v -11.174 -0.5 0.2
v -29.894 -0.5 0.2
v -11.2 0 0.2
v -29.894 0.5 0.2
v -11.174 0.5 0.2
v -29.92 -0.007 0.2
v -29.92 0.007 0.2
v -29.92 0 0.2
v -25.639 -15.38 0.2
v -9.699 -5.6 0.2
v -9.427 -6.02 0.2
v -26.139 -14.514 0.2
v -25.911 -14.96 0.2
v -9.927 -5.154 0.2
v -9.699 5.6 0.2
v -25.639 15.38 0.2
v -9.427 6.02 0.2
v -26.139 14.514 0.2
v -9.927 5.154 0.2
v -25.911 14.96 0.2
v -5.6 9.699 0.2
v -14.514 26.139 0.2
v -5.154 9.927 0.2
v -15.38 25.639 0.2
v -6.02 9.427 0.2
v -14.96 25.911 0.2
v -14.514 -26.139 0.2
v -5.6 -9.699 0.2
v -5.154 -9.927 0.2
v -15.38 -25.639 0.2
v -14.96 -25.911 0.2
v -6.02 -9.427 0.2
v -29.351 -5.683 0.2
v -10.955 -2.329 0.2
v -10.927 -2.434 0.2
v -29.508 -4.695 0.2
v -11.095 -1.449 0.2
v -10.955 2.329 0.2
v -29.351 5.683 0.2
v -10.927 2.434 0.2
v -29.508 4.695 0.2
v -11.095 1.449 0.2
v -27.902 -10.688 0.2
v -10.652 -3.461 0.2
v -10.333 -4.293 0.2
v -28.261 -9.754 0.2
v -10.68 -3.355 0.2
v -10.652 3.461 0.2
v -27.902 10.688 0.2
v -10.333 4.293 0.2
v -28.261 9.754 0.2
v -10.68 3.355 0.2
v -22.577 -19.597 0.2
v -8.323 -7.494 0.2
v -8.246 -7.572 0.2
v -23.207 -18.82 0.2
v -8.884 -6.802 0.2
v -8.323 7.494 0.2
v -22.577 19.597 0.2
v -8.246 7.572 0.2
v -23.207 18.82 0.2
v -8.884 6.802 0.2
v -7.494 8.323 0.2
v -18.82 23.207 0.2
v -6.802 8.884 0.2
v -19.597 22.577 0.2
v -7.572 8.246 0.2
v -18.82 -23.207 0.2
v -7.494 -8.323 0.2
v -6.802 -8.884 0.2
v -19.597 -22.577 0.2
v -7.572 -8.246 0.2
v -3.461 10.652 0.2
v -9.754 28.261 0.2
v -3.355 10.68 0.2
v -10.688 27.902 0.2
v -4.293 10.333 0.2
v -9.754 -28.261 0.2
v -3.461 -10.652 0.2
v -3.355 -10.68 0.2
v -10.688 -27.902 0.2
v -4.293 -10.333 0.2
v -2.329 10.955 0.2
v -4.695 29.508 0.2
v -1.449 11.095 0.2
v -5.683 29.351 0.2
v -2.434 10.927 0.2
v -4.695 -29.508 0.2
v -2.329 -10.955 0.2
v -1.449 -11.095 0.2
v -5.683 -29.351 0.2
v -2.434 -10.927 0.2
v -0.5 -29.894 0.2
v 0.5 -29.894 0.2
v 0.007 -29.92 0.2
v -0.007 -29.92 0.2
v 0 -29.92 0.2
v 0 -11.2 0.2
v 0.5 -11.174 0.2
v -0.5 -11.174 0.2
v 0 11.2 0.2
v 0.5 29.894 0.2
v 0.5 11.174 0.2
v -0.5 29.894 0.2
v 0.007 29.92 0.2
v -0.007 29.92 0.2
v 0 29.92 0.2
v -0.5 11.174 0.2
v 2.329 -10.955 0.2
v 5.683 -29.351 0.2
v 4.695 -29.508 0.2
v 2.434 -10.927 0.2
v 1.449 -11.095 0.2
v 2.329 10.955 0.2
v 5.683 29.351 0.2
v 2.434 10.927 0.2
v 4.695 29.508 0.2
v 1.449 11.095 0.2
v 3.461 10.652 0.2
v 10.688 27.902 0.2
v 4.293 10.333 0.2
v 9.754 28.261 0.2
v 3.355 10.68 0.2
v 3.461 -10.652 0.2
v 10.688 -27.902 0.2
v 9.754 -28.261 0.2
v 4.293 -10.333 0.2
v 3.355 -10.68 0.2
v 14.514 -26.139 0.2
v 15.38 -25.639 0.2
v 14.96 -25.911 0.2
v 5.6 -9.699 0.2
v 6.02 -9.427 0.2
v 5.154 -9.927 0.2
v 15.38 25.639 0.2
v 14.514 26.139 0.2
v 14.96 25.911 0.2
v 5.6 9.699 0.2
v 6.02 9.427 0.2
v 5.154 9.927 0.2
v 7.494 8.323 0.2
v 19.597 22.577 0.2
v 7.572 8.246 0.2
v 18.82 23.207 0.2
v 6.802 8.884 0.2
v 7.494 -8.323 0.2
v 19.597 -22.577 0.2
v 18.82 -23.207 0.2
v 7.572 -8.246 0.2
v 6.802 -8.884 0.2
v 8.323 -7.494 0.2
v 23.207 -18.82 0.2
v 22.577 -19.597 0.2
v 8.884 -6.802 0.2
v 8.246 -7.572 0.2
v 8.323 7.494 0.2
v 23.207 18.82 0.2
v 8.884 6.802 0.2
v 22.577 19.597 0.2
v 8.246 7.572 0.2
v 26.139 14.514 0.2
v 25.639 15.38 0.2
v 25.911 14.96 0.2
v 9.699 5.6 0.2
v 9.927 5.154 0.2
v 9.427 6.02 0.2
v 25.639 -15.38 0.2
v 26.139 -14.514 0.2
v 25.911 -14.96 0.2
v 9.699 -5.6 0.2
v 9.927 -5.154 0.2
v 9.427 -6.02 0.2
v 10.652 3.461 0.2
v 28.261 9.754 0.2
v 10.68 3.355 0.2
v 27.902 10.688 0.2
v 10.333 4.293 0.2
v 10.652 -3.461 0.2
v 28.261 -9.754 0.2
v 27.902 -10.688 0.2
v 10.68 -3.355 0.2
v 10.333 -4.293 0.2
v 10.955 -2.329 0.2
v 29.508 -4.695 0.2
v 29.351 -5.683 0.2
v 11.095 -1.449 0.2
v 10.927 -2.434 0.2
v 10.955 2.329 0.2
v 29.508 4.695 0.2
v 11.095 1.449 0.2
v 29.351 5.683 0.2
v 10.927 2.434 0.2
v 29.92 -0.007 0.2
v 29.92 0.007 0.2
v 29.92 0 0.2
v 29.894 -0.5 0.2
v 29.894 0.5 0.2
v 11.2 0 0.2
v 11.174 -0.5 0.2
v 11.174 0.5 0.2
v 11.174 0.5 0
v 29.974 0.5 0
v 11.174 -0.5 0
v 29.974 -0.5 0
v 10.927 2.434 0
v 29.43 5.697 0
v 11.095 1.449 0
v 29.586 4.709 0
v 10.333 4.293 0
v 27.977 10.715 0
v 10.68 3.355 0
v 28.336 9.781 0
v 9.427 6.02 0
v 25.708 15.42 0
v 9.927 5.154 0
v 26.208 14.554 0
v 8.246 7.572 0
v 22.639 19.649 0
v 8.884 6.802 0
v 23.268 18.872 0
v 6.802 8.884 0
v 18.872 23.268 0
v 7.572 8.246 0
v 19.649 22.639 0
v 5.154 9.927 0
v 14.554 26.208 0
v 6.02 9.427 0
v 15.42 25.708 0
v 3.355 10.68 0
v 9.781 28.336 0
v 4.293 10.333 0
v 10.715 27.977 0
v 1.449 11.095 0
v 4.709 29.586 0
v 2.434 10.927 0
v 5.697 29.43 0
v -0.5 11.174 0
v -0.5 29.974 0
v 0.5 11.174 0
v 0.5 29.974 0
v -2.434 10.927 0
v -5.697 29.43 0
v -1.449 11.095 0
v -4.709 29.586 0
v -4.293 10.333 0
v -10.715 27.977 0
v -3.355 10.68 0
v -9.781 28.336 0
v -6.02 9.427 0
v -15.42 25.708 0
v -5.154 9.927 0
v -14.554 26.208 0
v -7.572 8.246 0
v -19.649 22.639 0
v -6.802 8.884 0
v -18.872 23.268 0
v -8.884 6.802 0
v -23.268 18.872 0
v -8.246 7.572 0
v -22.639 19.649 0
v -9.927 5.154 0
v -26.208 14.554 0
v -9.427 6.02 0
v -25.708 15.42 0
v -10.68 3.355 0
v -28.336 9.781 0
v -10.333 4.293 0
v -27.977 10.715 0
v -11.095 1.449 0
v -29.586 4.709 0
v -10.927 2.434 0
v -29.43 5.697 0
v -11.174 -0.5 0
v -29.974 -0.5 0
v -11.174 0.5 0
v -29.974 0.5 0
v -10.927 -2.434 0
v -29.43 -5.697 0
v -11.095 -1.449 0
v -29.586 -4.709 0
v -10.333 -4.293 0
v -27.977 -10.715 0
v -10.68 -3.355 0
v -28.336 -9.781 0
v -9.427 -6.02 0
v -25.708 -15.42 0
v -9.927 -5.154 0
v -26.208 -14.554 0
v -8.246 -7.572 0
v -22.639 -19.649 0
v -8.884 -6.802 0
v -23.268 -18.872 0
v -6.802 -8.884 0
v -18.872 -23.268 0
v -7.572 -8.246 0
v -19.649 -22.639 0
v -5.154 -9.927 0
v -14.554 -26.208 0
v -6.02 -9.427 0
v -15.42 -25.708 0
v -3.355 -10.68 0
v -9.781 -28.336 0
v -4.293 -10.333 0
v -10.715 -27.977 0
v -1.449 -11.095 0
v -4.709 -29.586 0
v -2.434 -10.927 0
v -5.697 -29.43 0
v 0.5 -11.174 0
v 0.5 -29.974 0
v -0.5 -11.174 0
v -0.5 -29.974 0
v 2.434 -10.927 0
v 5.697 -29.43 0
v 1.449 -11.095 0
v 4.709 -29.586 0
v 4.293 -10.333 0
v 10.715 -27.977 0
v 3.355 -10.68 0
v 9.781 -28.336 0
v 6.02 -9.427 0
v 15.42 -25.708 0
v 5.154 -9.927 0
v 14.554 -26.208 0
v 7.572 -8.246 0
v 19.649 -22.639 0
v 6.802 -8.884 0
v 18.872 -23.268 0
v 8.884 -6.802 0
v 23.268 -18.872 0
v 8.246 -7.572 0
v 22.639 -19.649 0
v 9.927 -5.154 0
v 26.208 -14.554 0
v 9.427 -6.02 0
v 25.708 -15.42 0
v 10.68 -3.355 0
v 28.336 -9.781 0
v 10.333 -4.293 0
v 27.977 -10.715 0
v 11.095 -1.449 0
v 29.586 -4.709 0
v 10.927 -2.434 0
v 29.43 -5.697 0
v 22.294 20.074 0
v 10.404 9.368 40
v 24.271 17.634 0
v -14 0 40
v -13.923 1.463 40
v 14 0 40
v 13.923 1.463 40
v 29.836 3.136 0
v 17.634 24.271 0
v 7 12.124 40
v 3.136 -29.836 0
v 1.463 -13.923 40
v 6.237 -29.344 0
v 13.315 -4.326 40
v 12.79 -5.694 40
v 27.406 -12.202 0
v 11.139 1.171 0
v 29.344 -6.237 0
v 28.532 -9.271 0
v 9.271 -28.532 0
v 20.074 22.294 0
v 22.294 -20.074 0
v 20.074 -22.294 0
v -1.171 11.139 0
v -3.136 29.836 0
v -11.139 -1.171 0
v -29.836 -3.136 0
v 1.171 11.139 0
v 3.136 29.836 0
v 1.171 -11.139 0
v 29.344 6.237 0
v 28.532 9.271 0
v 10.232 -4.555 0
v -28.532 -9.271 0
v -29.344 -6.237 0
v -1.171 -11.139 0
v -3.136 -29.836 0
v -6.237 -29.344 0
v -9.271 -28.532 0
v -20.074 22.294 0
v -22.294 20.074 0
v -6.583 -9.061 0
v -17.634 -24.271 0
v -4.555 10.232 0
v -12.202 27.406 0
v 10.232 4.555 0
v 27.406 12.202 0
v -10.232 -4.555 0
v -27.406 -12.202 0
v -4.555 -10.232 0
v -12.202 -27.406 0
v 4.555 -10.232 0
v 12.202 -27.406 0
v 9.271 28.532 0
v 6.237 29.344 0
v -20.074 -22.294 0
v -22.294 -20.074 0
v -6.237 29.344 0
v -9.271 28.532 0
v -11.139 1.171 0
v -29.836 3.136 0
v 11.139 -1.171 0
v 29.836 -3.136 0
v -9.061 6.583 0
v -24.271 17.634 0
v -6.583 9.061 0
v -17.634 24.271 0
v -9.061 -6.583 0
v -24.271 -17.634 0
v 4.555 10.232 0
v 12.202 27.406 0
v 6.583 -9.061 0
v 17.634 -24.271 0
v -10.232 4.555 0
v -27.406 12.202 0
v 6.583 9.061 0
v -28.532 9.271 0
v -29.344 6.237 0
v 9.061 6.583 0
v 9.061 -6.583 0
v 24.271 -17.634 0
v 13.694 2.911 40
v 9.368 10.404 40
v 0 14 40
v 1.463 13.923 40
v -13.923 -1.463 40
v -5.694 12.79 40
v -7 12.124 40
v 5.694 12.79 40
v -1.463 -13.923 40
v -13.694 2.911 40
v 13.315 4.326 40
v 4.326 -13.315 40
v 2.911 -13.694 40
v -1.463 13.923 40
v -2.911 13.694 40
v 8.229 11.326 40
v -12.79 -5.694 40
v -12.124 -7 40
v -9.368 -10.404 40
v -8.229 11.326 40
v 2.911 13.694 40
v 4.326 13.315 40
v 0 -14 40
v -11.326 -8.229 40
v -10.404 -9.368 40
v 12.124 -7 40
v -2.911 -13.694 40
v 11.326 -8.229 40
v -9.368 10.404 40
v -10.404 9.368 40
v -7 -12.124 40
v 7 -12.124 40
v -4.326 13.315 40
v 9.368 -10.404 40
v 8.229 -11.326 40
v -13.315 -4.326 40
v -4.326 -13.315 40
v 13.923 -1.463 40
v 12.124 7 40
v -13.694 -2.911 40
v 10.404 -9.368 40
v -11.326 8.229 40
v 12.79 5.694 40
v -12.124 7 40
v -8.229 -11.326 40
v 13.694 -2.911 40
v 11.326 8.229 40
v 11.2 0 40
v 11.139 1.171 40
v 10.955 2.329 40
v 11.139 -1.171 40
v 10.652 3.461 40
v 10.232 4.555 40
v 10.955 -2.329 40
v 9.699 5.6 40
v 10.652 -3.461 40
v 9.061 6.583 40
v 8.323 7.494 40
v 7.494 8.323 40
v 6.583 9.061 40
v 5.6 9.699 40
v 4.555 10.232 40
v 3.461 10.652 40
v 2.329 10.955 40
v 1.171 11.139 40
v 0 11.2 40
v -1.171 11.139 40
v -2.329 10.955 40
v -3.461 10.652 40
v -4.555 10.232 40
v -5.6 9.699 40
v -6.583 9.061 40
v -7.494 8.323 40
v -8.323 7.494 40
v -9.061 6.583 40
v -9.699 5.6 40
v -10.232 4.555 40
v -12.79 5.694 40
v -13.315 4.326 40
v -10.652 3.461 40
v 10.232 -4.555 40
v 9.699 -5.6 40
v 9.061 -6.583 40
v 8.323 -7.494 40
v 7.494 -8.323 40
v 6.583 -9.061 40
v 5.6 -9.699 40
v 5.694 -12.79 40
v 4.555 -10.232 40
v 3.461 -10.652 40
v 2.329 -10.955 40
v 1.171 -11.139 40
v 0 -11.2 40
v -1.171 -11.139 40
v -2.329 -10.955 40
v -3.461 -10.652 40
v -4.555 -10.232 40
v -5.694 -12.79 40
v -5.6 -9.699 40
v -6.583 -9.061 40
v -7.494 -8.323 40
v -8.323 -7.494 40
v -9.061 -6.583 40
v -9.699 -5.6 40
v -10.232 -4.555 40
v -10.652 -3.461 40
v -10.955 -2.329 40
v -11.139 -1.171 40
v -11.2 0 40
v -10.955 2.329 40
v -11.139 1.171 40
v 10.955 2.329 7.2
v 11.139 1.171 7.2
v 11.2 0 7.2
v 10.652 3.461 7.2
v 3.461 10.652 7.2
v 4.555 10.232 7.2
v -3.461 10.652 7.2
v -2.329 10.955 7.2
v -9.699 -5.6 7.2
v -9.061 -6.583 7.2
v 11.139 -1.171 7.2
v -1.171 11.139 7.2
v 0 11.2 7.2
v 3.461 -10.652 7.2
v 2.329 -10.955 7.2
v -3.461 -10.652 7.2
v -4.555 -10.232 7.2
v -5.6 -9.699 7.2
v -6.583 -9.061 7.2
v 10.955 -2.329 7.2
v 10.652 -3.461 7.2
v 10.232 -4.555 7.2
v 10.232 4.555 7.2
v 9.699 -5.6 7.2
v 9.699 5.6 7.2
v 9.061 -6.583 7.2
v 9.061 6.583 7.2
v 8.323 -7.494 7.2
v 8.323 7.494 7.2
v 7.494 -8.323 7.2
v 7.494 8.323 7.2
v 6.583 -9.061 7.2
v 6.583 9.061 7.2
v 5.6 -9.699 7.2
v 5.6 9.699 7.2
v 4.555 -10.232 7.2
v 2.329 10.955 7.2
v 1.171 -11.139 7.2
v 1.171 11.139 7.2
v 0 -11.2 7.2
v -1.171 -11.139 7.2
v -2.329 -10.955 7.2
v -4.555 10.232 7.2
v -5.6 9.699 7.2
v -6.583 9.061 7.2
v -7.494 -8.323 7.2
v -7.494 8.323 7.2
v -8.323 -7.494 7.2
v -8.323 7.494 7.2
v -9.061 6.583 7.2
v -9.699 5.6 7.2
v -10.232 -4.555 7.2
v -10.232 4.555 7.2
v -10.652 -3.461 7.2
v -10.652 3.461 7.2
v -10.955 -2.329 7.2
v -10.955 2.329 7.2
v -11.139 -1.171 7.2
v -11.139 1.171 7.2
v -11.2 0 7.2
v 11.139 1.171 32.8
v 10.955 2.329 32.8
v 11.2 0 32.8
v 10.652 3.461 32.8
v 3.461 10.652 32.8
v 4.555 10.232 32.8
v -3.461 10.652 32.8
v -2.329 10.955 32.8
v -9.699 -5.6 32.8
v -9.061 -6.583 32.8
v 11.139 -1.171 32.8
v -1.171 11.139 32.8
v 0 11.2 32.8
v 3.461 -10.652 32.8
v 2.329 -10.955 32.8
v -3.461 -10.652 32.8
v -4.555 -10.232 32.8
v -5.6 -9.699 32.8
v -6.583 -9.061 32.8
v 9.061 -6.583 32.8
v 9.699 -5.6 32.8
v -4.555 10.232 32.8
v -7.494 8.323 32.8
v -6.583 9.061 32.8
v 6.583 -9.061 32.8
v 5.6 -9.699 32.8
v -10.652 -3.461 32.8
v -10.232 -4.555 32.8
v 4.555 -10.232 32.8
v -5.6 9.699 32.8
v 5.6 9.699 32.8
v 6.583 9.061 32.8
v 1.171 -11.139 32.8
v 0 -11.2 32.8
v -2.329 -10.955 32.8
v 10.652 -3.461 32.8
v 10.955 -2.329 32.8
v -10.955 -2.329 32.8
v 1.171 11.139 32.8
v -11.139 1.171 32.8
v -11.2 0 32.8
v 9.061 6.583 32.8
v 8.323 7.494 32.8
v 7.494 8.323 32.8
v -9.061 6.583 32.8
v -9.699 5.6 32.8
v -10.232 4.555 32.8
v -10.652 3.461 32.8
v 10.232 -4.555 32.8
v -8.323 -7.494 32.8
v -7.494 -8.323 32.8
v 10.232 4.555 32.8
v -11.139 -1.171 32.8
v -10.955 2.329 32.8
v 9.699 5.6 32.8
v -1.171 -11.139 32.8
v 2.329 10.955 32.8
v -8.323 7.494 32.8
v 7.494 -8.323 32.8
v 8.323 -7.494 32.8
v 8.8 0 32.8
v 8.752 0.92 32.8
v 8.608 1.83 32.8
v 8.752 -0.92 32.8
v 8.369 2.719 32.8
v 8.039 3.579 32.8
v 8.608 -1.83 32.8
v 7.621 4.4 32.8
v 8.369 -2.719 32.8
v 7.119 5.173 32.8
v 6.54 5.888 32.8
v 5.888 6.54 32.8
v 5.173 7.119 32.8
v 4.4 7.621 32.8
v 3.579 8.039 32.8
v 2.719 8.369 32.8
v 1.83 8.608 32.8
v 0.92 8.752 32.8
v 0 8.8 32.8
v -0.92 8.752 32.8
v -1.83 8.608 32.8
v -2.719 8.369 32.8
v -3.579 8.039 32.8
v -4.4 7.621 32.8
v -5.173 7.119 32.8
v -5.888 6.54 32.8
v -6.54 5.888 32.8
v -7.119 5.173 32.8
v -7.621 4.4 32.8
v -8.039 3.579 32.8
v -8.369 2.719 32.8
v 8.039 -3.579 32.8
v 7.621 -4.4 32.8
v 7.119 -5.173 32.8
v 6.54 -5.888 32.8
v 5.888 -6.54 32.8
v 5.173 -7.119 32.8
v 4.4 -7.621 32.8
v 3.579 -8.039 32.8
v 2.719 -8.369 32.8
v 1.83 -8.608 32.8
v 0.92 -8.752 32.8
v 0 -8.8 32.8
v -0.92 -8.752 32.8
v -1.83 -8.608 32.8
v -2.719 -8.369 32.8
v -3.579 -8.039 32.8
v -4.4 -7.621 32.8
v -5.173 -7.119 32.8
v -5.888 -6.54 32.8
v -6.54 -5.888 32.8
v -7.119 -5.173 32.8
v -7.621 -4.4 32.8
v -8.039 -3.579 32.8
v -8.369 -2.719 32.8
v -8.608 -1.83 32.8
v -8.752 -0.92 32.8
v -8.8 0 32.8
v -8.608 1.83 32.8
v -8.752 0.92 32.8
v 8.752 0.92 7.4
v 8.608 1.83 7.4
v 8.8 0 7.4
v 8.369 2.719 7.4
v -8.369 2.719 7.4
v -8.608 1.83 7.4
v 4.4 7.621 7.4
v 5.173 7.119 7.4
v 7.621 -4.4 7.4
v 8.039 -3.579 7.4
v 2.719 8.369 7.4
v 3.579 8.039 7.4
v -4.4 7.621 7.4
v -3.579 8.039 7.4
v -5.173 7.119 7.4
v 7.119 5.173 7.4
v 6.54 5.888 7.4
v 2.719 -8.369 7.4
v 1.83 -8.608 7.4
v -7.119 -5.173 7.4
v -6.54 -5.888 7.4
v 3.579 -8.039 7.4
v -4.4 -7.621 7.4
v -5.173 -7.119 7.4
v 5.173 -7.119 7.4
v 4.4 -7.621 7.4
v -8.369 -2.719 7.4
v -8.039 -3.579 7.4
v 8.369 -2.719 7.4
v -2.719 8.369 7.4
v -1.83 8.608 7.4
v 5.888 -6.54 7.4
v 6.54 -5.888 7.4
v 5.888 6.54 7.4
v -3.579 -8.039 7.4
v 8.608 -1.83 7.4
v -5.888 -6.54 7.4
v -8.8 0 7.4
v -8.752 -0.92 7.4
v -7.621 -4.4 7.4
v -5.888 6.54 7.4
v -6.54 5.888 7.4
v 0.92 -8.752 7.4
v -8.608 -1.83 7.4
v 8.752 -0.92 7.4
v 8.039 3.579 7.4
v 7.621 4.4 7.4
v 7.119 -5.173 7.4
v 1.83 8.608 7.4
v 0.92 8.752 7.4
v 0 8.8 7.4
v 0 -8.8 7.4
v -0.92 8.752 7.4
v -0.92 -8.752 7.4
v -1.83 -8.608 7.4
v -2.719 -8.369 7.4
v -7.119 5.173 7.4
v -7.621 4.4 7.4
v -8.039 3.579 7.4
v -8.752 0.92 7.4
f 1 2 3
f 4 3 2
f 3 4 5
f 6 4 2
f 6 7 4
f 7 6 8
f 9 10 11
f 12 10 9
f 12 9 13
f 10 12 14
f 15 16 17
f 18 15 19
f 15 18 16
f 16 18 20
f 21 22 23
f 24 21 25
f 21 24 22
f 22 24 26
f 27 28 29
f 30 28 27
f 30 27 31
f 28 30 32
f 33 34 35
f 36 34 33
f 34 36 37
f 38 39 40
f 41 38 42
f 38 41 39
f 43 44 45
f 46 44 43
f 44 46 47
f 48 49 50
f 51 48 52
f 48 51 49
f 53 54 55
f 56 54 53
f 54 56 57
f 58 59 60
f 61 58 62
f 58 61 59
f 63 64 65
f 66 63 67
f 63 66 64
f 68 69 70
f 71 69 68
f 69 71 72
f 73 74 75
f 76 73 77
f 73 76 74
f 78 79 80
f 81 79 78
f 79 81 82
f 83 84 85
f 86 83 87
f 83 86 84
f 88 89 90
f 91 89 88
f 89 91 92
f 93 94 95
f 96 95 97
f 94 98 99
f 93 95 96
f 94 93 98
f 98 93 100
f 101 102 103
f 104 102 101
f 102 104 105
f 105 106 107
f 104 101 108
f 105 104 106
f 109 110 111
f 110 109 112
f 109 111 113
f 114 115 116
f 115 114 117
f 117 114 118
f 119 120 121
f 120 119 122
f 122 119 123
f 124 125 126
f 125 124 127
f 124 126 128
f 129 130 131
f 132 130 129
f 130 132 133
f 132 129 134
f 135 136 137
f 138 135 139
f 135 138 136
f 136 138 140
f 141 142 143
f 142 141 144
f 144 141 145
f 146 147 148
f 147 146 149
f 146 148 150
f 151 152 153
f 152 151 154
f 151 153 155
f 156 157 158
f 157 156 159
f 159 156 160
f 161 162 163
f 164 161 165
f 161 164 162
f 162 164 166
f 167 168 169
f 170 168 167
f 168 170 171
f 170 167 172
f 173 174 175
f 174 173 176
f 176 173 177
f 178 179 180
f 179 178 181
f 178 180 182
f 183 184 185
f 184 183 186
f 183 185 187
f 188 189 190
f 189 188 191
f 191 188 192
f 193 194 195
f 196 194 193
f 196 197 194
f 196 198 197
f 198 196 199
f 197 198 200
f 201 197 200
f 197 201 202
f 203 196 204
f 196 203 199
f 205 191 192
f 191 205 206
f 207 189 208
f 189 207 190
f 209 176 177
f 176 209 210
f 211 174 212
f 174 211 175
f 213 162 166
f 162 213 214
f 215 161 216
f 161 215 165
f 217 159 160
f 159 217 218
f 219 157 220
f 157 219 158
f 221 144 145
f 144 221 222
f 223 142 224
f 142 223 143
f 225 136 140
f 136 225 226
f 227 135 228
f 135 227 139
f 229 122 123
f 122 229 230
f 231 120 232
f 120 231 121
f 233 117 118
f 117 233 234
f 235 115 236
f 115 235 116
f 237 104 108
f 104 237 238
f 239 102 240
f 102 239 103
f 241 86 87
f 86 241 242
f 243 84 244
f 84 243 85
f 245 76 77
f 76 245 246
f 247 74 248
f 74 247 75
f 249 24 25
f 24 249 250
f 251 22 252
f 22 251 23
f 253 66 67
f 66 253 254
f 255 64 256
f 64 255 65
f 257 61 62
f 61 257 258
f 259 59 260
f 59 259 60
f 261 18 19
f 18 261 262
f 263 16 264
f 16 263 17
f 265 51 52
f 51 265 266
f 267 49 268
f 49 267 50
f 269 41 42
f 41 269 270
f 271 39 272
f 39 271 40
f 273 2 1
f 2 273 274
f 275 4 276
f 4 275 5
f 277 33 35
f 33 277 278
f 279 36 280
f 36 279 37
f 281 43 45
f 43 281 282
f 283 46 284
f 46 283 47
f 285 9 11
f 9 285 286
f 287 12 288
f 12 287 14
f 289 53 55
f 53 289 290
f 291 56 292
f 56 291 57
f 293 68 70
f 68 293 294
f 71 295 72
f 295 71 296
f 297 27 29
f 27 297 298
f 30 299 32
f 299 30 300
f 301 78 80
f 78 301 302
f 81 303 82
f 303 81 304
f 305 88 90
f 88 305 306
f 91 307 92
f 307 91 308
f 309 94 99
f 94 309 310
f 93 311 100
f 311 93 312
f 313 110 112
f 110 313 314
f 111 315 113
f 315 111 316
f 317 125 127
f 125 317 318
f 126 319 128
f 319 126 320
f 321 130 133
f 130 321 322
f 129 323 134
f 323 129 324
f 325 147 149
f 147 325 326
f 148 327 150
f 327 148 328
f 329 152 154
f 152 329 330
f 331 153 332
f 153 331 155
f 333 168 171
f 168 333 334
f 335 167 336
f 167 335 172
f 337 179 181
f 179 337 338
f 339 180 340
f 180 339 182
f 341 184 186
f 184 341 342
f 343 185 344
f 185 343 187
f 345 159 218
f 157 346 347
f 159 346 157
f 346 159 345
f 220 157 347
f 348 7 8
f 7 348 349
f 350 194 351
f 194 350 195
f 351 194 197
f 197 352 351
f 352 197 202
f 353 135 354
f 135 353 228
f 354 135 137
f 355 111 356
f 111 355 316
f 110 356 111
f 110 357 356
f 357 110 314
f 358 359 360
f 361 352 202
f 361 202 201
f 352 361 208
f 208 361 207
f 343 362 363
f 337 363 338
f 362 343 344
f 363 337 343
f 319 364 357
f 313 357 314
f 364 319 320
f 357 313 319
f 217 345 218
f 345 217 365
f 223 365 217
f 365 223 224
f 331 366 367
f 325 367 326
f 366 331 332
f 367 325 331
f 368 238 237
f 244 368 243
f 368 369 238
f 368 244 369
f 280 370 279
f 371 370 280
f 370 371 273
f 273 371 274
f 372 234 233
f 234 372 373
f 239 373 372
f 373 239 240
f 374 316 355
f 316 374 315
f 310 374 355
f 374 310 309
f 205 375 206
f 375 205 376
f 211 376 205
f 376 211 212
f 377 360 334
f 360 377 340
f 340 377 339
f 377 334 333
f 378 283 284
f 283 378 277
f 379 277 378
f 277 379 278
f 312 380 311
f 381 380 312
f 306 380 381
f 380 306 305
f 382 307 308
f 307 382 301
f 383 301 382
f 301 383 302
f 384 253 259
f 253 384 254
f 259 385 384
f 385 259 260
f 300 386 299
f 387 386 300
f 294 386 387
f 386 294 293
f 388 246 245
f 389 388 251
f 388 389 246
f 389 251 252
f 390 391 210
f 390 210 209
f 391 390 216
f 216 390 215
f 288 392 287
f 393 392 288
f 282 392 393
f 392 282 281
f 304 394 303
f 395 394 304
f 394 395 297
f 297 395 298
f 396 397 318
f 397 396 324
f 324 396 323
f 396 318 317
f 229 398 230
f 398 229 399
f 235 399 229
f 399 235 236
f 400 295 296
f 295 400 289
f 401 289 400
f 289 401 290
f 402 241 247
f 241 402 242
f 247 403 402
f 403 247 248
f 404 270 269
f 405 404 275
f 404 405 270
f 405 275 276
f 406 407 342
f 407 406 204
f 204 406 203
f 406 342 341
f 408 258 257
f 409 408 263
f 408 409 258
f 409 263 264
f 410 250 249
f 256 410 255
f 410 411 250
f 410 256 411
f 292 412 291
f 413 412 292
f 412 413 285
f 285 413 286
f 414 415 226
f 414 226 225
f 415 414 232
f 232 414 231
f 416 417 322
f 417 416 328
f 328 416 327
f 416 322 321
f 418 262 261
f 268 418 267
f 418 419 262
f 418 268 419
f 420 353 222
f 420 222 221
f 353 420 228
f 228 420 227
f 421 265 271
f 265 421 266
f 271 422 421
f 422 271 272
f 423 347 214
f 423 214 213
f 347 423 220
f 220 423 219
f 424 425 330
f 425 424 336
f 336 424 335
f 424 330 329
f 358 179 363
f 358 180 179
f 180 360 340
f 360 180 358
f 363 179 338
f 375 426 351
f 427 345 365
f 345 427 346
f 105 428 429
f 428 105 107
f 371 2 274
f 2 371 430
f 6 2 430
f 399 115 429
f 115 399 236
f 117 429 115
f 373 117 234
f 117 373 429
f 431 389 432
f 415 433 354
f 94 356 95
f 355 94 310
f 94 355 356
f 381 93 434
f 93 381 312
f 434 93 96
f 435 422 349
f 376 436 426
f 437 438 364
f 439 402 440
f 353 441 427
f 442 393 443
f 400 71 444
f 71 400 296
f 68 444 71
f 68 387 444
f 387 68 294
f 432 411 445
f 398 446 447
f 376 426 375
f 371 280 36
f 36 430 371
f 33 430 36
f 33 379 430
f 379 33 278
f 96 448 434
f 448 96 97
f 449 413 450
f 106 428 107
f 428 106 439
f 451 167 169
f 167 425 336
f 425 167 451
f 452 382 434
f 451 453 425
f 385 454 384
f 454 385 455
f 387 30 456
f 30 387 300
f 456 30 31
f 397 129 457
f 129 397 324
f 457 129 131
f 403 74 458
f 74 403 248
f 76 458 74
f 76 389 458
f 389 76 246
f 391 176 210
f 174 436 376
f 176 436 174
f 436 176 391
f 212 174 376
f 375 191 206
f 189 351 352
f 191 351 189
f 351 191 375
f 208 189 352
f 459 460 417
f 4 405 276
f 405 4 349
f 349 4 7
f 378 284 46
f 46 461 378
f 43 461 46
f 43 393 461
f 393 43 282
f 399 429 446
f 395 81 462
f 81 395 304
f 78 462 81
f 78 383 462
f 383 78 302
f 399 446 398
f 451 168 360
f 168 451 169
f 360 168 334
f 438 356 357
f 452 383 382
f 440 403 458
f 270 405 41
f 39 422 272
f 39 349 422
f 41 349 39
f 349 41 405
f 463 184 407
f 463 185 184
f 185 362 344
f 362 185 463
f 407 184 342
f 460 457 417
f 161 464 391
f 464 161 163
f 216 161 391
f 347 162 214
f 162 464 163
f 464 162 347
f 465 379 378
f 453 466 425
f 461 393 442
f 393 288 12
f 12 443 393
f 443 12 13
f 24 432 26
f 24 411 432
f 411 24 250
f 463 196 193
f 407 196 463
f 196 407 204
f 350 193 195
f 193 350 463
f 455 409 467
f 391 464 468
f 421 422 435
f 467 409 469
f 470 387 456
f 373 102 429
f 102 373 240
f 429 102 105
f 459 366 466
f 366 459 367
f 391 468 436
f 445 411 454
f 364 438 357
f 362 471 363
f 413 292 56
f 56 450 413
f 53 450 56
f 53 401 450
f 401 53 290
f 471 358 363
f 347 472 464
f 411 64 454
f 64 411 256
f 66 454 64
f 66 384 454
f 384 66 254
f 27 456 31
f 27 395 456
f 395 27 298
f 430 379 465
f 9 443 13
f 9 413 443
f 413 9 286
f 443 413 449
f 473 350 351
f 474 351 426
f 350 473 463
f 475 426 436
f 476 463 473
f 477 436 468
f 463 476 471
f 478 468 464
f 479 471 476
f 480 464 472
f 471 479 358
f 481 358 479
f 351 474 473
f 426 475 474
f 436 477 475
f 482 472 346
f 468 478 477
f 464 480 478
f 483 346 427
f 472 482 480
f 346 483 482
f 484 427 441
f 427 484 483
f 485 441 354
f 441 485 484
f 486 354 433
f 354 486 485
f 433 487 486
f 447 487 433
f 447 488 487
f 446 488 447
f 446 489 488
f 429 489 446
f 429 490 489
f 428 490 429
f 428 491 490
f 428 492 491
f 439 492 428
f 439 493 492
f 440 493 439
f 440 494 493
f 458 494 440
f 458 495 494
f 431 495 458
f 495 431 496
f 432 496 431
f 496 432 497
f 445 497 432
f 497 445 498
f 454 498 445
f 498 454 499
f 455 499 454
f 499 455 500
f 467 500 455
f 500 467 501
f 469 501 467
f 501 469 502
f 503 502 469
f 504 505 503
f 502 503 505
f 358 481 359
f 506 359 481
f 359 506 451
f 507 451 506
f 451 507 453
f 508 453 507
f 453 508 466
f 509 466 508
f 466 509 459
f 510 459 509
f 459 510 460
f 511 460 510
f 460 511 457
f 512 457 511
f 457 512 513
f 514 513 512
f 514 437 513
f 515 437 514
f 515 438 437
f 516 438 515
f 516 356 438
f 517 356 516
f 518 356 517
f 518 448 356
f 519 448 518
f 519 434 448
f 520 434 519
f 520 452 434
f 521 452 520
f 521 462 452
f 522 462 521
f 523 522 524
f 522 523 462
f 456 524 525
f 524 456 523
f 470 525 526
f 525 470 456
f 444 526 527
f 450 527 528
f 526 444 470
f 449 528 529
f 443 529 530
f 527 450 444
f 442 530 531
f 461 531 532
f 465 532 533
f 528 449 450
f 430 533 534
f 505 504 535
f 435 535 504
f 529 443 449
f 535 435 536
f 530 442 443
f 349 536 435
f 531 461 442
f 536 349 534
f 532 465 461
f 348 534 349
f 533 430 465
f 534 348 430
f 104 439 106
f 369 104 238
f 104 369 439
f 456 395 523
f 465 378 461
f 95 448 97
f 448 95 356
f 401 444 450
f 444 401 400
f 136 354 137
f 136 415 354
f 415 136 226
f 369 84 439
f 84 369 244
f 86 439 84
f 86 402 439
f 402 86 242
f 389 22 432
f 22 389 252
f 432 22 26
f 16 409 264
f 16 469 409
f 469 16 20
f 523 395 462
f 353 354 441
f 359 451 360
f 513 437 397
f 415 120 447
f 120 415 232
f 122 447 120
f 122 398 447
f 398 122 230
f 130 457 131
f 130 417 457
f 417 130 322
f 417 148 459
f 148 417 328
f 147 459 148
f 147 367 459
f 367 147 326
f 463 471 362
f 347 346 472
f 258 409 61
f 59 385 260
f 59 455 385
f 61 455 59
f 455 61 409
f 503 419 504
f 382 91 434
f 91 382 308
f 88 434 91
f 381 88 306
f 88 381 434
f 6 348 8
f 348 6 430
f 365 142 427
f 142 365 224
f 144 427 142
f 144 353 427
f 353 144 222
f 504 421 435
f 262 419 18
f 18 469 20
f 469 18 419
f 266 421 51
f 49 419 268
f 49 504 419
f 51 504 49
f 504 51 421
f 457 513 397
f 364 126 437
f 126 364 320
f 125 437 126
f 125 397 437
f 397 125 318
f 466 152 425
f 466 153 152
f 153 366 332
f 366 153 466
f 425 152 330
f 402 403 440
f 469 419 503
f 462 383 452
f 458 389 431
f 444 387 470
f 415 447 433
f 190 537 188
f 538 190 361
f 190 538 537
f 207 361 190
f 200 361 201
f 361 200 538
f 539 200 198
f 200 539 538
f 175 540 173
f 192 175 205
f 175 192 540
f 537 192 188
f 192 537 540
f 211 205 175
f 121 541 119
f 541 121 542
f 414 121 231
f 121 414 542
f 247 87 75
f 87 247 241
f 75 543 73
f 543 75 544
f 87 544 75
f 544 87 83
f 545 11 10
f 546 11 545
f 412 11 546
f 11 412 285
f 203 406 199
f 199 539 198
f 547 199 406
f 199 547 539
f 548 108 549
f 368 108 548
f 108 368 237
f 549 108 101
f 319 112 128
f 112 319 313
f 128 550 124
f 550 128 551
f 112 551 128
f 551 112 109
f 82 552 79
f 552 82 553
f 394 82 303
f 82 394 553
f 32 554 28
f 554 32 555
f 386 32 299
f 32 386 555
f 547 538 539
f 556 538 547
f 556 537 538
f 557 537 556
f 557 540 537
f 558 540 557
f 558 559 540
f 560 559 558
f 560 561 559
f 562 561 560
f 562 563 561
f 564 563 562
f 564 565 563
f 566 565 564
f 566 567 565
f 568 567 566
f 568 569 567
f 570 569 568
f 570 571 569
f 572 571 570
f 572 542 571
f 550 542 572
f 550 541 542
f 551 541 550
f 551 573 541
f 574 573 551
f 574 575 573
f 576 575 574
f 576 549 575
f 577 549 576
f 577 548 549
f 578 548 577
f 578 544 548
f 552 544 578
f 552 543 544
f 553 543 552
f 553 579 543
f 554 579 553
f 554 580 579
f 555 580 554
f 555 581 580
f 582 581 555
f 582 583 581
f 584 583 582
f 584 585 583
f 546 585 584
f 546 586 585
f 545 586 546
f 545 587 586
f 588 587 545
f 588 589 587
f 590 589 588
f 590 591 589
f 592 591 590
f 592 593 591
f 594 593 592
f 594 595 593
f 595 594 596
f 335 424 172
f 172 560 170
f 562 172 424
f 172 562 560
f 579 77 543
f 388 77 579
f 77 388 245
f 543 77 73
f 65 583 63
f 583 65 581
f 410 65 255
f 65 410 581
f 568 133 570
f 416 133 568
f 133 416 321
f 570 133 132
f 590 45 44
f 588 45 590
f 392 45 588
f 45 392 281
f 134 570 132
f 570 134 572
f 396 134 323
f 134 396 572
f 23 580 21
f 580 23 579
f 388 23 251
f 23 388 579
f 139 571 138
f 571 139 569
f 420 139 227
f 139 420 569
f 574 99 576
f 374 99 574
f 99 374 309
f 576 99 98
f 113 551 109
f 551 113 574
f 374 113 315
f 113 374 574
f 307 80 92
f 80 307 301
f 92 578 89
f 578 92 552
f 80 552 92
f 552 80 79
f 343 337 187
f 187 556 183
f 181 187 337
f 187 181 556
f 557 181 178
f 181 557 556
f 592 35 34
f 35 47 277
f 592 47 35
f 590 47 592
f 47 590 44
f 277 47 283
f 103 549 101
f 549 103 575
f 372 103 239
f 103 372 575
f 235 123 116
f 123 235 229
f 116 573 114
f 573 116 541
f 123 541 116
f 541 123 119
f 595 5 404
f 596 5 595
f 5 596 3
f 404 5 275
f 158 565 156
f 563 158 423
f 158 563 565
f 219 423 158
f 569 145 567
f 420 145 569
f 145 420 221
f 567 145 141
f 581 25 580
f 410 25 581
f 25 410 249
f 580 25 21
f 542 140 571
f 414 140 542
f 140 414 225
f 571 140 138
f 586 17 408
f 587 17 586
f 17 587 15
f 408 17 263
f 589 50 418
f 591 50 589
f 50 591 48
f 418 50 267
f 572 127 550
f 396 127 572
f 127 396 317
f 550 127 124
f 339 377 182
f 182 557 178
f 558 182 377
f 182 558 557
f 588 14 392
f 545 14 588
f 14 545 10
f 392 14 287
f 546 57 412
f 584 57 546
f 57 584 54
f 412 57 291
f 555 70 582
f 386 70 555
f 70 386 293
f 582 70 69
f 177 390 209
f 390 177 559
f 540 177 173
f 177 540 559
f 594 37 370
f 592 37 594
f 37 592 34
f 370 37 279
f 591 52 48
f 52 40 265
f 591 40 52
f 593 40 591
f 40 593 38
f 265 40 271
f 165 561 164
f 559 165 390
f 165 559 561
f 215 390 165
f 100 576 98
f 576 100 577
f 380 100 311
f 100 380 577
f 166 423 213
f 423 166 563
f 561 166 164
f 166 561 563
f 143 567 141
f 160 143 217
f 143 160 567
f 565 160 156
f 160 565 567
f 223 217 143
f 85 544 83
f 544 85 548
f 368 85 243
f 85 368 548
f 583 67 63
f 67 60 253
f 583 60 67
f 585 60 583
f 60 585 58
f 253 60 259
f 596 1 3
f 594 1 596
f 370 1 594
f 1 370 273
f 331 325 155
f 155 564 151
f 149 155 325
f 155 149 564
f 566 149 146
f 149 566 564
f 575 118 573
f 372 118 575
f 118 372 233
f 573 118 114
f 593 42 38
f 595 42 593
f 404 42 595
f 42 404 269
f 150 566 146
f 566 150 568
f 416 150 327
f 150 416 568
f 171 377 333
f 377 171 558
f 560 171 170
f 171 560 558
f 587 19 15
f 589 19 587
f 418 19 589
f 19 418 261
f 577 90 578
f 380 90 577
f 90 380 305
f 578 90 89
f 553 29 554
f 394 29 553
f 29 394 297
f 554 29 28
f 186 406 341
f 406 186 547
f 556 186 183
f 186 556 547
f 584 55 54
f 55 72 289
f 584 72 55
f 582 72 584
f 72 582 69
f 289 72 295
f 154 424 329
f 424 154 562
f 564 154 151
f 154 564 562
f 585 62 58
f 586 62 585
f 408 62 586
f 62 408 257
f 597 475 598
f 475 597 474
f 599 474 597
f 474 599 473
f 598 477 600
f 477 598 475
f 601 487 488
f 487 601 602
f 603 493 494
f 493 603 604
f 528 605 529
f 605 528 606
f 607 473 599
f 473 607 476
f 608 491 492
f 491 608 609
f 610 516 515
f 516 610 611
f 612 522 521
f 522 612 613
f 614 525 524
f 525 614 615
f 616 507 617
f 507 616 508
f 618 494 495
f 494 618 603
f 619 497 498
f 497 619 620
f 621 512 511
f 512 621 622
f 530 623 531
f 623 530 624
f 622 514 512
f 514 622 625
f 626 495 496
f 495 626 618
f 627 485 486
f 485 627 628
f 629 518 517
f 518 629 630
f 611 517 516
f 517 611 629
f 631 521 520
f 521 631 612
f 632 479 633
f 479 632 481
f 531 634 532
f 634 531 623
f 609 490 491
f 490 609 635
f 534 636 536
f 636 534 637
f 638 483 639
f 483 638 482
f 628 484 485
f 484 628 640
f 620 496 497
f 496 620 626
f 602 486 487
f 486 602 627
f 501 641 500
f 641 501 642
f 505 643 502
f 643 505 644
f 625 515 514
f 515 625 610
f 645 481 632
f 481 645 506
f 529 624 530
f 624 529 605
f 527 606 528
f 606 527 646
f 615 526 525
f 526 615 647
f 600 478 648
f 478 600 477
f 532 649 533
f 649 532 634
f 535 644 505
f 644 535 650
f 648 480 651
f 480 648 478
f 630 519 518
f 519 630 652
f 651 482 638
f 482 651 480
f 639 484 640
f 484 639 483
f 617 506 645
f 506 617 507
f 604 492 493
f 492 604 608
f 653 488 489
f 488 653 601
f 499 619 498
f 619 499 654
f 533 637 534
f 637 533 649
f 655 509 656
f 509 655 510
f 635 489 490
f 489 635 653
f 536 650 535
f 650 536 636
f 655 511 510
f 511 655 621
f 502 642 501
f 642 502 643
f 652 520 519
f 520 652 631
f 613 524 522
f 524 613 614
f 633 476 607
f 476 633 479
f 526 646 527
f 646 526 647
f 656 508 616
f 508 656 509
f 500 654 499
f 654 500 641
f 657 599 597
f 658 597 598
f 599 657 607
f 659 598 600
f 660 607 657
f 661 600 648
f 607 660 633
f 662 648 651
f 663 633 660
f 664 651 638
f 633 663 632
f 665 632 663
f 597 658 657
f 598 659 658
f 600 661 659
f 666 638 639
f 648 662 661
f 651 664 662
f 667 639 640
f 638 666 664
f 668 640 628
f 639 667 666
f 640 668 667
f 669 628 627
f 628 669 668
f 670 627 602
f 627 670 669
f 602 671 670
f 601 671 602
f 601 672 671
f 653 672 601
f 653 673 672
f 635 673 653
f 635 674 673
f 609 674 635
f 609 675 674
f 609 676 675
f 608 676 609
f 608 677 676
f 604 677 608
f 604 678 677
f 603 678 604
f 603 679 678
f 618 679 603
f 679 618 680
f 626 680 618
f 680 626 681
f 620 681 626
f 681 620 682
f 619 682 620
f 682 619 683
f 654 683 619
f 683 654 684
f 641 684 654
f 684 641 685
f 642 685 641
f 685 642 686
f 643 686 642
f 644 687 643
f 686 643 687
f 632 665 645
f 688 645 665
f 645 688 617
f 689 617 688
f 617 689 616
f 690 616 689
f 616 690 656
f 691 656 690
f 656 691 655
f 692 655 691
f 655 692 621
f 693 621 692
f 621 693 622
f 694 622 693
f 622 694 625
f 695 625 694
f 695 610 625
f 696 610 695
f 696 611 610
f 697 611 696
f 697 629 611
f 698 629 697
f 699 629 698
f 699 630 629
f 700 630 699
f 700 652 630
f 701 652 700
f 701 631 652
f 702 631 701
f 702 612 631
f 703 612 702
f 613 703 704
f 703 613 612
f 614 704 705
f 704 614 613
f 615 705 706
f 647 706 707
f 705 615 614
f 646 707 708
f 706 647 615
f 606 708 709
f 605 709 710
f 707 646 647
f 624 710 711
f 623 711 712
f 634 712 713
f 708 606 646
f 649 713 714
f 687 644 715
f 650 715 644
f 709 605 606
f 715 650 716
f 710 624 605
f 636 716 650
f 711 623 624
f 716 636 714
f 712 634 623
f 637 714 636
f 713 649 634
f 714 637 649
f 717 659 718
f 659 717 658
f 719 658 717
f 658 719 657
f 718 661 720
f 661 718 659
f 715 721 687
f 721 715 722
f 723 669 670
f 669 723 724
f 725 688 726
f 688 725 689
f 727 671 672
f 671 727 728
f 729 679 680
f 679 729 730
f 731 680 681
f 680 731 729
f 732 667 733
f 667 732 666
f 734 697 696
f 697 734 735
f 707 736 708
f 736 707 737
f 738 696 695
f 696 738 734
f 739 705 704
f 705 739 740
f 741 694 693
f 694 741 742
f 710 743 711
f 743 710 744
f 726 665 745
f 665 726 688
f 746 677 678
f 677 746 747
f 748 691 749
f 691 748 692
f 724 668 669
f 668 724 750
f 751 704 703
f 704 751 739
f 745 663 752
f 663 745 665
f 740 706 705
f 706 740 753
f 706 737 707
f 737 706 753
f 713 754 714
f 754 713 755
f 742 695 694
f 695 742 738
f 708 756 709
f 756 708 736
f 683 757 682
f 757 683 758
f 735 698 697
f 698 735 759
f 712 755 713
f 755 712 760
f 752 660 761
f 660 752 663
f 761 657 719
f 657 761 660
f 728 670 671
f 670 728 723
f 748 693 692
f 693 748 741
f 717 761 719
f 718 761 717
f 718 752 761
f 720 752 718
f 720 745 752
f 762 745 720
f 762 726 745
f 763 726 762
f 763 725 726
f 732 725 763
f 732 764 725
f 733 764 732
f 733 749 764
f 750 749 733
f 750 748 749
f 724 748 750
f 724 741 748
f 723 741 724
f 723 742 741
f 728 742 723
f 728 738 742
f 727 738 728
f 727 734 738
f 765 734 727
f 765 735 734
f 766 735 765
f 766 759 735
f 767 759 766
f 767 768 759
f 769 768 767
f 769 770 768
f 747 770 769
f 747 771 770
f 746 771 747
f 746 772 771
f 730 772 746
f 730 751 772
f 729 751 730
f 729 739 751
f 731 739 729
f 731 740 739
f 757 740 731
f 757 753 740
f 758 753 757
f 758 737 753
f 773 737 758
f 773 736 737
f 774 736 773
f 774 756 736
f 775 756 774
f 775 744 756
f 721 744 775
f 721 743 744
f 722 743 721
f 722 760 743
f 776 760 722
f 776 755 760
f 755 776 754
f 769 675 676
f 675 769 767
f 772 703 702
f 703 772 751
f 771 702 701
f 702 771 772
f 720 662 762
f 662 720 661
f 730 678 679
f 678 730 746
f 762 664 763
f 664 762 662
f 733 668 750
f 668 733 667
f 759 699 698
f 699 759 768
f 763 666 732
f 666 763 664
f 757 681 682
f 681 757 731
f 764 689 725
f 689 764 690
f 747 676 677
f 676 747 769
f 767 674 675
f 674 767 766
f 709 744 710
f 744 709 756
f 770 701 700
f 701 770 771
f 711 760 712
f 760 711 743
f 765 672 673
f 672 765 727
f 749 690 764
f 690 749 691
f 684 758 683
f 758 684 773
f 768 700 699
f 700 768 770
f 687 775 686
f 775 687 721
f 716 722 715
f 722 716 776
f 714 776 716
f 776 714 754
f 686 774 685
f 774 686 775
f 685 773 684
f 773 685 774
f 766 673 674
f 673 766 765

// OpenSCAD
smallOD = 28;
largeOD = 60;
height = 40;
bearingOD = 22;
bearingT = 7;
clearance = 0.2;
layerHeight = 0.2;

$fn = 60;


module roueSupportBobine() {
	difference() {
		cylinder( r1=largeOD/2, r2=smallOD/2, h=height );
		translate( [0, 0, -1] )
			cylinder( r=bearingOD/2+clearance, h=bearingT+clearance+1);
		translate( [0, 0, height-bearingT-clearance] )
			cylinder( r=bearingOD/2+clearance, h=bearingT+clearance+1);
		translate( [0, 0, bearingT+clearance+layerHeight] )
			cylinder( r=bearingOD/2*0.8, h=height);
		for ( i=[0:10:360] ) {
			rotate( [0, 0, i] )
				translate( [0, -0.5, -1] )
					cube( [largeOD, 1, layerHeight+1]);
		}
	}
}


roueSupportBobine();
